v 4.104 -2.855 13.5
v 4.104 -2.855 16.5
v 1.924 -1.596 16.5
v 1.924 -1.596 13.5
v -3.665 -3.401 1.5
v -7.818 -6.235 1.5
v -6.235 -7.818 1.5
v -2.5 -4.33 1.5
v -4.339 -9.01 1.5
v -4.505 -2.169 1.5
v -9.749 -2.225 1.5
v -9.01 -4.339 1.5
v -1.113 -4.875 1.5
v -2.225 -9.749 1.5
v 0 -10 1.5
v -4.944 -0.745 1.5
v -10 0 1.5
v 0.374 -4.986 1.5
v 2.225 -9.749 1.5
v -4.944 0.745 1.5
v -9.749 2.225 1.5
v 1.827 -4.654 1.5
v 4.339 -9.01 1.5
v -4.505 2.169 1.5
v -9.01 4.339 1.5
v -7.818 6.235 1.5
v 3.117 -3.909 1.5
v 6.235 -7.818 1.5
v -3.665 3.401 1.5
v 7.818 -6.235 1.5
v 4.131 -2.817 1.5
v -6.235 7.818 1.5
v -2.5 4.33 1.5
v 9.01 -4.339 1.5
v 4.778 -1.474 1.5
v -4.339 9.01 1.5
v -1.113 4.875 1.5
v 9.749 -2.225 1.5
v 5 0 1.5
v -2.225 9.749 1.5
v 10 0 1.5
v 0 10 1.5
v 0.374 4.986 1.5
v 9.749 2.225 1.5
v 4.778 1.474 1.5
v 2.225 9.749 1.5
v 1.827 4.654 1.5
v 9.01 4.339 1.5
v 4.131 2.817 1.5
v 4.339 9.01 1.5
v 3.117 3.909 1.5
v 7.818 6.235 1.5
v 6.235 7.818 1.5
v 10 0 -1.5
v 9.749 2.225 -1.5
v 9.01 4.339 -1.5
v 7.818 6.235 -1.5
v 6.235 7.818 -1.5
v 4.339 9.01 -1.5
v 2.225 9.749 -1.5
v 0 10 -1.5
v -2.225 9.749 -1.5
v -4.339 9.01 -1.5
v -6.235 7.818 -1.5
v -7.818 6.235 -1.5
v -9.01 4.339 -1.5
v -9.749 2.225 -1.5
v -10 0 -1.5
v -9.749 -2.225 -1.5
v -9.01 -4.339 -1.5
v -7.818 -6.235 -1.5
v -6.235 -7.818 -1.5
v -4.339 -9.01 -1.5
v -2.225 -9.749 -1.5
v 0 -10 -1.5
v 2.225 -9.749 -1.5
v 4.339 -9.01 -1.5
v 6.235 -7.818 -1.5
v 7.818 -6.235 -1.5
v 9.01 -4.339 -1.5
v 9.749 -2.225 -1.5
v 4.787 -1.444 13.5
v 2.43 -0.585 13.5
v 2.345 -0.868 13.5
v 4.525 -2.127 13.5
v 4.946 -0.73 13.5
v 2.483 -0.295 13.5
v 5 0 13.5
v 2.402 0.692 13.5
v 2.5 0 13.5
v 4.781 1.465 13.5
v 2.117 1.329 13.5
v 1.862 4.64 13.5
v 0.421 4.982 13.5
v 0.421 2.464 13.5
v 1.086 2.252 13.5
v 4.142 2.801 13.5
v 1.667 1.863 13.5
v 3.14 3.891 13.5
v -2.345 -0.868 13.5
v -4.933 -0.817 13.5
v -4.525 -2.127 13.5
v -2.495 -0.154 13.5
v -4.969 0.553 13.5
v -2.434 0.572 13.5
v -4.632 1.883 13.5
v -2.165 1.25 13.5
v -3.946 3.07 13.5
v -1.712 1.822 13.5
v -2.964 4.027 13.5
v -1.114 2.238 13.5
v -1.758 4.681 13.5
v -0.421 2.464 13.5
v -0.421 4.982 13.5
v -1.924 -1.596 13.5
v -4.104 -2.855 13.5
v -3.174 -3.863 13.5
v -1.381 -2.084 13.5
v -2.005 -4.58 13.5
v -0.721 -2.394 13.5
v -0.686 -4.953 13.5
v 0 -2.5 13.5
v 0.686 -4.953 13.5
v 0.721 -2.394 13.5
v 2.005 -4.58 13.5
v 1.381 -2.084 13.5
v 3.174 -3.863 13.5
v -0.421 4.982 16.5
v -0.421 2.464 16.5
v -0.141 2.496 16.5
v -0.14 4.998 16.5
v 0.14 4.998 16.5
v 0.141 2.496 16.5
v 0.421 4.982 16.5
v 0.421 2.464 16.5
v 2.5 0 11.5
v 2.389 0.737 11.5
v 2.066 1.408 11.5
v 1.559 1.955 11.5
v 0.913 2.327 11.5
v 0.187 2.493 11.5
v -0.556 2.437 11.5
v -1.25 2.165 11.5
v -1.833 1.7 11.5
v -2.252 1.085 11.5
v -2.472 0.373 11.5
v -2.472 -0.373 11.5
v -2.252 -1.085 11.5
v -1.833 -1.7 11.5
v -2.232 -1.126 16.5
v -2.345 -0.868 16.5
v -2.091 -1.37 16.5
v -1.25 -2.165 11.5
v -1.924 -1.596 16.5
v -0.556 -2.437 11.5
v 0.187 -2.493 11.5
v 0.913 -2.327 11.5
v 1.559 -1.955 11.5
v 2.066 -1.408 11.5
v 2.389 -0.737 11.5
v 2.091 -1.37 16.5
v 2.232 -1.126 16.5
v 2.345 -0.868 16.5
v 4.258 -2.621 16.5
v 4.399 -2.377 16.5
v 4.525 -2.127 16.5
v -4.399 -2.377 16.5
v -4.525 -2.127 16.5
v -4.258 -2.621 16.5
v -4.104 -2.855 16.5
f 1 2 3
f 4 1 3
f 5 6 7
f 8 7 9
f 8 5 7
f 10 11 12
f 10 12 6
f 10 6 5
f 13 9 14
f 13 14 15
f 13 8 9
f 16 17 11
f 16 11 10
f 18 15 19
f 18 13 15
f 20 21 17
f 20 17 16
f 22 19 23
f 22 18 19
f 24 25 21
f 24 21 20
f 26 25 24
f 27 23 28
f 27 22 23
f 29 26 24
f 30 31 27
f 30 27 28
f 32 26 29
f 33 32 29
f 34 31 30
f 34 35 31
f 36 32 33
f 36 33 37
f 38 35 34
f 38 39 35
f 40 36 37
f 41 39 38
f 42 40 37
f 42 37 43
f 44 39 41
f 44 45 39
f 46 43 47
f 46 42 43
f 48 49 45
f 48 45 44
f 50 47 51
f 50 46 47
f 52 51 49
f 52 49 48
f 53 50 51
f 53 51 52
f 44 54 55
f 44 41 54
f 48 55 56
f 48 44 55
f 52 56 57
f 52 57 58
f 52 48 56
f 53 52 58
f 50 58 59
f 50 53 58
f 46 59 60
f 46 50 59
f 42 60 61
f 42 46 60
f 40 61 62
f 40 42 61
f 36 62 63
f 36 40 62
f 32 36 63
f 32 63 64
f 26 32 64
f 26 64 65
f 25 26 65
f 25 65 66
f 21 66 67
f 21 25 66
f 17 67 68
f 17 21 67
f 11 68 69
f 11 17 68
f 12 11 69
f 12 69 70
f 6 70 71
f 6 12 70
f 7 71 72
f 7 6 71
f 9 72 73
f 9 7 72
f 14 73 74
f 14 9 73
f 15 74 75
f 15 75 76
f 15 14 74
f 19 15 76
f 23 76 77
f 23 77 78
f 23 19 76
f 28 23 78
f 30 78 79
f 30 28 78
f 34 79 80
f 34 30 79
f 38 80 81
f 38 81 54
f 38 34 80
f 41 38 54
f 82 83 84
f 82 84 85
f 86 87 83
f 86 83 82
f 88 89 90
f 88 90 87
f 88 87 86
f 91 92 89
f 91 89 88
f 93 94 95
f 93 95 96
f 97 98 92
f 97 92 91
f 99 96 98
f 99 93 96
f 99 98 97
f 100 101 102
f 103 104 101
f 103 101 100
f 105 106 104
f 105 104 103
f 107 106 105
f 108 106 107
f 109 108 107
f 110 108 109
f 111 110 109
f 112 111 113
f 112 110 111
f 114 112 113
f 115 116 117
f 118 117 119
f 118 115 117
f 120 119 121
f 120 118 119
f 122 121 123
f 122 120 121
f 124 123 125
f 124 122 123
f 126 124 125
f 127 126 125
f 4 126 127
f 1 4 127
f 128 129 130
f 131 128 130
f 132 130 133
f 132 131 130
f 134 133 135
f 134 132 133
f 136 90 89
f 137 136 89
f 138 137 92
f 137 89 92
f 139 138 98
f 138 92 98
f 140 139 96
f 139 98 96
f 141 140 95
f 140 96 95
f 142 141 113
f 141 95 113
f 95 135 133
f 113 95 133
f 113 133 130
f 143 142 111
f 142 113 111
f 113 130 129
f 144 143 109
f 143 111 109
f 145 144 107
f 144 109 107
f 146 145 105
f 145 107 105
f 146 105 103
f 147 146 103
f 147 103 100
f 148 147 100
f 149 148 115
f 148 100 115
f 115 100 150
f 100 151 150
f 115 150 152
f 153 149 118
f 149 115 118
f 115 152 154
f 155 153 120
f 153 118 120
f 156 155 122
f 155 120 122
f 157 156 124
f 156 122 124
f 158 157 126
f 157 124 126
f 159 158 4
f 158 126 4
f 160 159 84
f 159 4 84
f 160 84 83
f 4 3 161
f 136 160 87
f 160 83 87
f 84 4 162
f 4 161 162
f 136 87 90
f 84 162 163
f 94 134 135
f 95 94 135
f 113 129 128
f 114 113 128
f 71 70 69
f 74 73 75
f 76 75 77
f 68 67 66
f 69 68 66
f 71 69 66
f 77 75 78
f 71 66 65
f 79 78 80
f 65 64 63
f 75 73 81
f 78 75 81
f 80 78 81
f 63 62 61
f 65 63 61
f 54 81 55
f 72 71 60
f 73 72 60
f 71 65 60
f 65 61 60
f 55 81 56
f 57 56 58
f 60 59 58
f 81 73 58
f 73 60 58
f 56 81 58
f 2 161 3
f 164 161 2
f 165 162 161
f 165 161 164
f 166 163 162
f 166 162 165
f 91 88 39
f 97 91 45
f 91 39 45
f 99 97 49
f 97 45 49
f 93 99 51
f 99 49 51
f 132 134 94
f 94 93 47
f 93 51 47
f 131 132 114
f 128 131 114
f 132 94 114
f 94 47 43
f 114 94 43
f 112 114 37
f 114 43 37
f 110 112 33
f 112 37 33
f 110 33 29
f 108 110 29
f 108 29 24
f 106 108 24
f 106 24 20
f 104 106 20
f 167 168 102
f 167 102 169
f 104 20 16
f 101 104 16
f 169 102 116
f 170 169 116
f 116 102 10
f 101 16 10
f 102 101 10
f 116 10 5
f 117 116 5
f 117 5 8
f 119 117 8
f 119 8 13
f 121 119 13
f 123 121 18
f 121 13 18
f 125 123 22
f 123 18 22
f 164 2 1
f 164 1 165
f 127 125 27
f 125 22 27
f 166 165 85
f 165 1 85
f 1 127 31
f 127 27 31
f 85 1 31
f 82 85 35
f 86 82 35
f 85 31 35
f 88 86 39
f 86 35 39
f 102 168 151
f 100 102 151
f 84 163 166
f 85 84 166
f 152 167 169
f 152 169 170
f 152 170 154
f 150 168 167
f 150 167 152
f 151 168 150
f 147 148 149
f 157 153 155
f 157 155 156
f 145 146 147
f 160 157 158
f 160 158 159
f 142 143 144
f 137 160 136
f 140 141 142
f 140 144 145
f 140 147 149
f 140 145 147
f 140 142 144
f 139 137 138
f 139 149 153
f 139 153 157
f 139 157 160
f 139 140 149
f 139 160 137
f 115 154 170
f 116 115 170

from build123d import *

# Parameters (mm, degrees)
SKETCH16_R          = 10
BOSS_EXTRUDE4_DEPTH = 1.5
SKETCH17_R          = 5
BOSS_EXTRUDE5_DEPTH = 15
SKETCH18_R          = 2.5
CUT_EXTRUDE4_DEPTH  = 5
CUT_EXTRUDE7_DEPTH  = 3


with BuildPart() as part:
    # Sketch16 → Boss-Extrude4 (new body, symmetric)
    with BuildSketch(Plane.XY):
        Circle(SKETCH16_R)
    extrude(amount=BOSS_EXTRUDE4_DEPTH, both=True)

    # Sketch17 → Boss-Extrude5 (add)
    with BuildSketch(Plane.XY.offset(1.5)):
        Circle(SKETCH17_R)
    extrude(amount=BOSS_EXTRUDE5_DEPTH)

    # Sketch18 → Cut-Extrude4 (cut)
    with BuildSketch(Plane.XY.offset(16.5)):
        Circle(SKETCH18_R)
    extrude(amount=-CUT_EXTRUDE4_DEPTH, mode=Mode.SUBTRACT)

    # Sketch19 → Cut-Extrude7 (cut)
    with BuildSketch(Plane.XY.offset(16.5)):
        with BuildLine():
            ThreePointArc((-2.344526361, -0.867868735), (-2.165063509, 1.25), (-0.420666809, 2.464353756))
            Line((-0.420666809, 2.464353756), (-0.420666809, 4.982272517))
            ThreePointArc((-0.420666809, 4.982272517), (-4.330127019, 2.5), (-4.525107973, -2.126828116))
            Line((-4.525107973, -2.126828116), (-2.344526361, -0.867868735))
        make_face()
        with BuildLine():
            Line((0.420666809, 4.982272517), (0.420666809, 2.464353756))
            ThreePointArc((0.420666809, 2.464353756), (1.910715445, 1.612193068), (2.5, 0))
            ThreePointArc((2.5, 0), (2.460824649, -0.44084243), (2.344526361, -0.867868735))
            Line((2.344526361, -0.867868735), (4.525107973, -2.126828116))
            ThreePointArc((4.525107973, -2.126828116), (4.879832982, -1.089600875), (5, 0))
            ThreePointArc((5, 0), (3.681258891, 3.383538529), (0.420666809, 4.982272517))
        make_face()
        with BuildLine():
            Line((4.104441164, -2.855444402), (1.923859552, -1.596485021))
            ThreePointArc((1.923859552, -1.596485021), (0, -2.5), (-1.923859552, -1.596485021))
            Line((-1.923859552, -1.596485021), (-4.104441164, -2.855444402))
            ThreePointArc((-4.104441164, -2.855444402), (0, -5), (4.104441164, -2.855444402))
        make_face()
    extrude(amount=-CUT_EXTRUDE7_DEPTH, mode=Mode.SUBTRACT)


solid = part.part
